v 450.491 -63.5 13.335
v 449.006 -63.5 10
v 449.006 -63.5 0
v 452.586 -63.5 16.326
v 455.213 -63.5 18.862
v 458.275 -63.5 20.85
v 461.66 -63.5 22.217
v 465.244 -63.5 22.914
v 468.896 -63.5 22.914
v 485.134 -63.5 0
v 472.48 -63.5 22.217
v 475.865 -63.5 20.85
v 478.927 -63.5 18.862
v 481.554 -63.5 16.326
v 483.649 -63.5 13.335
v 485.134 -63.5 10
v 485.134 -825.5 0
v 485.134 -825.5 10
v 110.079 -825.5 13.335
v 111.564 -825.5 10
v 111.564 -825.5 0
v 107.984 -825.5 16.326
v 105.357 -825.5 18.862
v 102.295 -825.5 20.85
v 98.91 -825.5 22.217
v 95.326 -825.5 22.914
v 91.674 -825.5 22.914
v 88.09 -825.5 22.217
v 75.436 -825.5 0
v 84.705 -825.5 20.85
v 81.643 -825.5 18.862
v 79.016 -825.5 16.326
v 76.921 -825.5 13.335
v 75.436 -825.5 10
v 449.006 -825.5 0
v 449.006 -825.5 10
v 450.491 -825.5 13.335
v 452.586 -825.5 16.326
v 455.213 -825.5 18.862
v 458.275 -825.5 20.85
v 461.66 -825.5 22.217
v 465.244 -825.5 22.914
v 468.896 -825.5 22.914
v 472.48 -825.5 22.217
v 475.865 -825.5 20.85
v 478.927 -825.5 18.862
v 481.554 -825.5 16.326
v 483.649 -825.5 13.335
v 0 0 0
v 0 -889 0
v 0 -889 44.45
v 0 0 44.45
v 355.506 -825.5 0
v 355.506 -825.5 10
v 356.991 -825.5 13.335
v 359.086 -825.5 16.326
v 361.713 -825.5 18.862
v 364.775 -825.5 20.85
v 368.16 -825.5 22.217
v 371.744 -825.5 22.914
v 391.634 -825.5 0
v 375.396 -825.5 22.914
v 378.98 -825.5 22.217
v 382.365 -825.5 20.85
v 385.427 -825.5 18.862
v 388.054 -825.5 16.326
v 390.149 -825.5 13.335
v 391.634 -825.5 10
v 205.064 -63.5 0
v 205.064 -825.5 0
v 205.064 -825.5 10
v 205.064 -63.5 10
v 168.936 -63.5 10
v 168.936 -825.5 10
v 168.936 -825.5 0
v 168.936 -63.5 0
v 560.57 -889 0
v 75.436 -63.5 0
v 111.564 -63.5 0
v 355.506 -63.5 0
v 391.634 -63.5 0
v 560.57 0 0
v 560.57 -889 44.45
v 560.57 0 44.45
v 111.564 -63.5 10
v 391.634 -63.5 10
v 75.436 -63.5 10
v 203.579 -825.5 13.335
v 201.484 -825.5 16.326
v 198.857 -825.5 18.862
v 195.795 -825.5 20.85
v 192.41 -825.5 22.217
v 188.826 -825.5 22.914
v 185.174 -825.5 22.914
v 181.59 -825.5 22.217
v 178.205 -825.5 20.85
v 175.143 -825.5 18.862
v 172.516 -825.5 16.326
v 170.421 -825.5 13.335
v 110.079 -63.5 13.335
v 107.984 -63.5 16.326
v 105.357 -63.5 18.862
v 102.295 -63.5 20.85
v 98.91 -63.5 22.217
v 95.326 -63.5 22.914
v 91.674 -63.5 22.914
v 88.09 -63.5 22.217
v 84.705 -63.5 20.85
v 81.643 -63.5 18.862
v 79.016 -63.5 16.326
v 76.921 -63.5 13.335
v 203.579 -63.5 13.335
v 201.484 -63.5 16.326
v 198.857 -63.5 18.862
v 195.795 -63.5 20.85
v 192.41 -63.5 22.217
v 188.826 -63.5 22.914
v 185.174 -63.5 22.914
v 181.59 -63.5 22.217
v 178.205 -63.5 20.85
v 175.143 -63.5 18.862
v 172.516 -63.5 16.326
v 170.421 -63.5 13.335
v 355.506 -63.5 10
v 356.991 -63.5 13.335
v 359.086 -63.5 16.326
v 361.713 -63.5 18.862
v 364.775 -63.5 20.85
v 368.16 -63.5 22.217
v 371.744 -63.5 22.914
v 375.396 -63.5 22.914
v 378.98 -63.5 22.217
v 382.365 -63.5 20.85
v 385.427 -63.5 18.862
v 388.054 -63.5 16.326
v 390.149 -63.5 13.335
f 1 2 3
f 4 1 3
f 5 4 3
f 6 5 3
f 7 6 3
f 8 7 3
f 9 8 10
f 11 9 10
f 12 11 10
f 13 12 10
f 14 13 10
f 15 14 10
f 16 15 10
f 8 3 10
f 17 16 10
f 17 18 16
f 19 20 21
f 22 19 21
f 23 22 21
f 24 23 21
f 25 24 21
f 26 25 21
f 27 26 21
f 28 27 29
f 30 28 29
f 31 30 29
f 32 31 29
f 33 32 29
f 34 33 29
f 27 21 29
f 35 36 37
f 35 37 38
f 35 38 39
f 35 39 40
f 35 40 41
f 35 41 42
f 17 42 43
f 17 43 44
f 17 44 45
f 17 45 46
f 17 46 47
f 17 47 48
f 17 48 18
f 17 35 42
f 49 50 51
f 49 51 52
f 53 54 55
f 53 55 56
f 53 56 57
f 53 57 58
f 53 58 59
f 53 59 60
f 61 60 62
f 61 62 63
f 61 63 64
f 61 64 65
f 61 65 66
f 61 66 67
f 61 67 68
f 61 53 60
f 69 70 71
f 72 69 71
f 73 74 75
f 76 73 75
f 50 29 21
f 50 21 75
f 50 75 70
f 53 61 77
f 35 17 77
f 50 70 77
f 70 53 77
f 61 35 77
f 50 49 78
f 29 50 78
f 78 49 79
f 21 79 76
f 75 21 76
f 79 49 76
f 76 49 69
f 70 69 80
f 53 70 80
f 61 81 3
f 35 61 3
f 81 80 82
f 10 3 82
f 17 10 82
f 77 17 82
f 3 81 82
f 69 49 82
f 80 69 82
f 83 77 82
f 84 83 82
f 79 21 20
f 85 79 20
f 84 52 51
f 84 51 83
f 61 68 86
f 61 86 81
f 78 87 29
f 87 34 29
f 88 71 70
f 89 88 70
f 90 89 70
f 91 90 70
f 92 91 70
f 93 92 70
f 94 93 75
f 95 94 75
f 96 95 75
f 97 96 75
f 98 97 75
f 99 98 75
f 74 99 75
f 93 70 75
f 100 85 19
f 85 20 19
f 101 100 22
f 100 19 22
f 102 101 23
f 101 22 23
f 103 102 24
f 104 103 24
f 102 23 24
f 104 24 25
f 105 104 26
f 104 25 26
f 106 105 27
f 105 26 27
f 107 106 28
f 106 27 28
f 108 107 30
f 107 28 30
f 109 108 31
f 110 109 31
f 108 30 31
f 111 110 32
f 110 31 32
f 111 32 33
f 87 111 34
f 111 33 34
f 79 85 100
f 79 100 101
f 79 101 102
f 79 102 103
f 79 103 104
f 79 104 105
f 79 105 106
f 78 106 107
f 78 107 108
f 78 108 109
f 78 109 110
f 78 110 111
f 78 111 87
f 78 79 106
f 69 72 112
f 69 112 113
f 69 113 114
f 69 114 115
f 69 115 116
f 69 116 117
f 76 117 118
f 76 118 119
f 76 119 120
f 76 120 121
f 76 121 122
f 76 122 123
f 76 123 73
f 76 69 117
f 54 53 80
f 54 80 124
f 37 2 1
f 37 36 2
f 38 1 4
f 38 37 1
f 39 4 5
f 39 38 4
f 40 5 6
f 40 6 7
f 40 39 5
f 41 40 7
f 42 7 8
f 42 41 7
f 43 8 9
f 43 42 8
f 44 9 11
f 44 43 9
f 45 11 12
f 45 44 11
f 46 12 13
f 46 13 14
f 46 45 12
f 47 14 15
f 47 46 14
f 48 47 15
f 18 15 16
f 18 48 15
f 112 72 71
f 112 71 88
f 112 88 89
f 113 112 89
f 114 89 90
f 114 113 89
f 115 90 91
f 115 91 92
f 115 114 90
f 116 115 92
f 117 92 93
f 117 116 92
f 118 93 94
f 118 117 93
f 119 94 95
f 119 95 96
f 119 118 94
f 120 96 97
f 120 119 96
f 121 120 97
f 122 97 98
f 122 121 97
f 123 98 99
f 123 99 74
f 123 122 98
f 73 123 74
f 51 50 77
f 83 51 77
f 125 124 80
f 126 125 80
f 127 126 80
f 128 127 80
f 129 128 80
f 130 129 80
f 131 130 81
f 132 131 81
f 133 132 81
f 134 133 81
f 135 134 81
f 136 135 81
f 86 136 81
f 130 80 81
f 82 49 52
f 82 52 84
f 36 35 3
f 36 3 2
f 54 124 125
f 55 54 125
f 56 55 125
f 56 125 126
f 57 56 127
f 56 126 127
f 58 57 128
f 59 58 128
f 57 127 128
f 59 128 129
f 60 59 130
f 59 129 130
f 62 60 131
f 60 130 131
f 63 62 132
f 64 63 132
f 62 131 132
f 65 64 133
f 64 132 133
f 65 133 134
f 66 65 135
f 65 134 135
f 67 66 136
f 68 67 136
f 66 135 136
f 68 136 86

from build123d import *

# Parameters (mm, degrees)
SKETCH1_W           = 560.57
SKETCH1_H           = 889
BOSS_EXTRUDE1_DEPTH = 44.45
CUT_EXTRUDE2_DEPTH  = 381


with BuildPart() as part:
    # Sketch1 → Boss-Extrude1 (new body)
    with BuildSketch(Plane.XY):
        with Locations((280.285, -444.5)):
            Rectangle(SKETCH1_W, SKETCH1_H)
    extrude(amount=BOSS_EXTRUDE1_DEPTH)

    # Sketch2 → Cut-Extrude2 (cut, symmetric)
    with BuildSketch(Plane(origin=(0, -444.5, 0), x_dir=(1, 0, 0), z_dir=(0, 1, 0))):
        with BuildLine():
            Line((75.435663802, -10), (75.435663802, 0))
            Line((75.435663802, 0), (111.564336198, 0))
            Line((111.564336198, 0), (111.564336198, -10))
            ThreePointArc((111.564336198, -10), (93.5, -23.001673148), (75.435663802, -10))
        make_face()
        with BuildLine():
            Line((168.935663802, -10), (168.935663802, 0))
            Line((168.935663802, 0), (205.064336198, 0))
            Line((205.064336198, 0), (205.064336198, -10))
            ThreePointArc((205.064336198, -10), (187, -23.001673148), (168.935663802, -10))
        make_face()
    cut_extrude2 = extrude(amount=CUT_EXTRUDE2_DEPTH, both=True, mode=Mode.SUBTRACT)

    # Mirror1: Cut-Extrude2 across plane
    add(cut_extrude2.mirror(Plane.ZY.offset(-280.285)), mode=Mode.SUBTRACT)


solid = part.part
